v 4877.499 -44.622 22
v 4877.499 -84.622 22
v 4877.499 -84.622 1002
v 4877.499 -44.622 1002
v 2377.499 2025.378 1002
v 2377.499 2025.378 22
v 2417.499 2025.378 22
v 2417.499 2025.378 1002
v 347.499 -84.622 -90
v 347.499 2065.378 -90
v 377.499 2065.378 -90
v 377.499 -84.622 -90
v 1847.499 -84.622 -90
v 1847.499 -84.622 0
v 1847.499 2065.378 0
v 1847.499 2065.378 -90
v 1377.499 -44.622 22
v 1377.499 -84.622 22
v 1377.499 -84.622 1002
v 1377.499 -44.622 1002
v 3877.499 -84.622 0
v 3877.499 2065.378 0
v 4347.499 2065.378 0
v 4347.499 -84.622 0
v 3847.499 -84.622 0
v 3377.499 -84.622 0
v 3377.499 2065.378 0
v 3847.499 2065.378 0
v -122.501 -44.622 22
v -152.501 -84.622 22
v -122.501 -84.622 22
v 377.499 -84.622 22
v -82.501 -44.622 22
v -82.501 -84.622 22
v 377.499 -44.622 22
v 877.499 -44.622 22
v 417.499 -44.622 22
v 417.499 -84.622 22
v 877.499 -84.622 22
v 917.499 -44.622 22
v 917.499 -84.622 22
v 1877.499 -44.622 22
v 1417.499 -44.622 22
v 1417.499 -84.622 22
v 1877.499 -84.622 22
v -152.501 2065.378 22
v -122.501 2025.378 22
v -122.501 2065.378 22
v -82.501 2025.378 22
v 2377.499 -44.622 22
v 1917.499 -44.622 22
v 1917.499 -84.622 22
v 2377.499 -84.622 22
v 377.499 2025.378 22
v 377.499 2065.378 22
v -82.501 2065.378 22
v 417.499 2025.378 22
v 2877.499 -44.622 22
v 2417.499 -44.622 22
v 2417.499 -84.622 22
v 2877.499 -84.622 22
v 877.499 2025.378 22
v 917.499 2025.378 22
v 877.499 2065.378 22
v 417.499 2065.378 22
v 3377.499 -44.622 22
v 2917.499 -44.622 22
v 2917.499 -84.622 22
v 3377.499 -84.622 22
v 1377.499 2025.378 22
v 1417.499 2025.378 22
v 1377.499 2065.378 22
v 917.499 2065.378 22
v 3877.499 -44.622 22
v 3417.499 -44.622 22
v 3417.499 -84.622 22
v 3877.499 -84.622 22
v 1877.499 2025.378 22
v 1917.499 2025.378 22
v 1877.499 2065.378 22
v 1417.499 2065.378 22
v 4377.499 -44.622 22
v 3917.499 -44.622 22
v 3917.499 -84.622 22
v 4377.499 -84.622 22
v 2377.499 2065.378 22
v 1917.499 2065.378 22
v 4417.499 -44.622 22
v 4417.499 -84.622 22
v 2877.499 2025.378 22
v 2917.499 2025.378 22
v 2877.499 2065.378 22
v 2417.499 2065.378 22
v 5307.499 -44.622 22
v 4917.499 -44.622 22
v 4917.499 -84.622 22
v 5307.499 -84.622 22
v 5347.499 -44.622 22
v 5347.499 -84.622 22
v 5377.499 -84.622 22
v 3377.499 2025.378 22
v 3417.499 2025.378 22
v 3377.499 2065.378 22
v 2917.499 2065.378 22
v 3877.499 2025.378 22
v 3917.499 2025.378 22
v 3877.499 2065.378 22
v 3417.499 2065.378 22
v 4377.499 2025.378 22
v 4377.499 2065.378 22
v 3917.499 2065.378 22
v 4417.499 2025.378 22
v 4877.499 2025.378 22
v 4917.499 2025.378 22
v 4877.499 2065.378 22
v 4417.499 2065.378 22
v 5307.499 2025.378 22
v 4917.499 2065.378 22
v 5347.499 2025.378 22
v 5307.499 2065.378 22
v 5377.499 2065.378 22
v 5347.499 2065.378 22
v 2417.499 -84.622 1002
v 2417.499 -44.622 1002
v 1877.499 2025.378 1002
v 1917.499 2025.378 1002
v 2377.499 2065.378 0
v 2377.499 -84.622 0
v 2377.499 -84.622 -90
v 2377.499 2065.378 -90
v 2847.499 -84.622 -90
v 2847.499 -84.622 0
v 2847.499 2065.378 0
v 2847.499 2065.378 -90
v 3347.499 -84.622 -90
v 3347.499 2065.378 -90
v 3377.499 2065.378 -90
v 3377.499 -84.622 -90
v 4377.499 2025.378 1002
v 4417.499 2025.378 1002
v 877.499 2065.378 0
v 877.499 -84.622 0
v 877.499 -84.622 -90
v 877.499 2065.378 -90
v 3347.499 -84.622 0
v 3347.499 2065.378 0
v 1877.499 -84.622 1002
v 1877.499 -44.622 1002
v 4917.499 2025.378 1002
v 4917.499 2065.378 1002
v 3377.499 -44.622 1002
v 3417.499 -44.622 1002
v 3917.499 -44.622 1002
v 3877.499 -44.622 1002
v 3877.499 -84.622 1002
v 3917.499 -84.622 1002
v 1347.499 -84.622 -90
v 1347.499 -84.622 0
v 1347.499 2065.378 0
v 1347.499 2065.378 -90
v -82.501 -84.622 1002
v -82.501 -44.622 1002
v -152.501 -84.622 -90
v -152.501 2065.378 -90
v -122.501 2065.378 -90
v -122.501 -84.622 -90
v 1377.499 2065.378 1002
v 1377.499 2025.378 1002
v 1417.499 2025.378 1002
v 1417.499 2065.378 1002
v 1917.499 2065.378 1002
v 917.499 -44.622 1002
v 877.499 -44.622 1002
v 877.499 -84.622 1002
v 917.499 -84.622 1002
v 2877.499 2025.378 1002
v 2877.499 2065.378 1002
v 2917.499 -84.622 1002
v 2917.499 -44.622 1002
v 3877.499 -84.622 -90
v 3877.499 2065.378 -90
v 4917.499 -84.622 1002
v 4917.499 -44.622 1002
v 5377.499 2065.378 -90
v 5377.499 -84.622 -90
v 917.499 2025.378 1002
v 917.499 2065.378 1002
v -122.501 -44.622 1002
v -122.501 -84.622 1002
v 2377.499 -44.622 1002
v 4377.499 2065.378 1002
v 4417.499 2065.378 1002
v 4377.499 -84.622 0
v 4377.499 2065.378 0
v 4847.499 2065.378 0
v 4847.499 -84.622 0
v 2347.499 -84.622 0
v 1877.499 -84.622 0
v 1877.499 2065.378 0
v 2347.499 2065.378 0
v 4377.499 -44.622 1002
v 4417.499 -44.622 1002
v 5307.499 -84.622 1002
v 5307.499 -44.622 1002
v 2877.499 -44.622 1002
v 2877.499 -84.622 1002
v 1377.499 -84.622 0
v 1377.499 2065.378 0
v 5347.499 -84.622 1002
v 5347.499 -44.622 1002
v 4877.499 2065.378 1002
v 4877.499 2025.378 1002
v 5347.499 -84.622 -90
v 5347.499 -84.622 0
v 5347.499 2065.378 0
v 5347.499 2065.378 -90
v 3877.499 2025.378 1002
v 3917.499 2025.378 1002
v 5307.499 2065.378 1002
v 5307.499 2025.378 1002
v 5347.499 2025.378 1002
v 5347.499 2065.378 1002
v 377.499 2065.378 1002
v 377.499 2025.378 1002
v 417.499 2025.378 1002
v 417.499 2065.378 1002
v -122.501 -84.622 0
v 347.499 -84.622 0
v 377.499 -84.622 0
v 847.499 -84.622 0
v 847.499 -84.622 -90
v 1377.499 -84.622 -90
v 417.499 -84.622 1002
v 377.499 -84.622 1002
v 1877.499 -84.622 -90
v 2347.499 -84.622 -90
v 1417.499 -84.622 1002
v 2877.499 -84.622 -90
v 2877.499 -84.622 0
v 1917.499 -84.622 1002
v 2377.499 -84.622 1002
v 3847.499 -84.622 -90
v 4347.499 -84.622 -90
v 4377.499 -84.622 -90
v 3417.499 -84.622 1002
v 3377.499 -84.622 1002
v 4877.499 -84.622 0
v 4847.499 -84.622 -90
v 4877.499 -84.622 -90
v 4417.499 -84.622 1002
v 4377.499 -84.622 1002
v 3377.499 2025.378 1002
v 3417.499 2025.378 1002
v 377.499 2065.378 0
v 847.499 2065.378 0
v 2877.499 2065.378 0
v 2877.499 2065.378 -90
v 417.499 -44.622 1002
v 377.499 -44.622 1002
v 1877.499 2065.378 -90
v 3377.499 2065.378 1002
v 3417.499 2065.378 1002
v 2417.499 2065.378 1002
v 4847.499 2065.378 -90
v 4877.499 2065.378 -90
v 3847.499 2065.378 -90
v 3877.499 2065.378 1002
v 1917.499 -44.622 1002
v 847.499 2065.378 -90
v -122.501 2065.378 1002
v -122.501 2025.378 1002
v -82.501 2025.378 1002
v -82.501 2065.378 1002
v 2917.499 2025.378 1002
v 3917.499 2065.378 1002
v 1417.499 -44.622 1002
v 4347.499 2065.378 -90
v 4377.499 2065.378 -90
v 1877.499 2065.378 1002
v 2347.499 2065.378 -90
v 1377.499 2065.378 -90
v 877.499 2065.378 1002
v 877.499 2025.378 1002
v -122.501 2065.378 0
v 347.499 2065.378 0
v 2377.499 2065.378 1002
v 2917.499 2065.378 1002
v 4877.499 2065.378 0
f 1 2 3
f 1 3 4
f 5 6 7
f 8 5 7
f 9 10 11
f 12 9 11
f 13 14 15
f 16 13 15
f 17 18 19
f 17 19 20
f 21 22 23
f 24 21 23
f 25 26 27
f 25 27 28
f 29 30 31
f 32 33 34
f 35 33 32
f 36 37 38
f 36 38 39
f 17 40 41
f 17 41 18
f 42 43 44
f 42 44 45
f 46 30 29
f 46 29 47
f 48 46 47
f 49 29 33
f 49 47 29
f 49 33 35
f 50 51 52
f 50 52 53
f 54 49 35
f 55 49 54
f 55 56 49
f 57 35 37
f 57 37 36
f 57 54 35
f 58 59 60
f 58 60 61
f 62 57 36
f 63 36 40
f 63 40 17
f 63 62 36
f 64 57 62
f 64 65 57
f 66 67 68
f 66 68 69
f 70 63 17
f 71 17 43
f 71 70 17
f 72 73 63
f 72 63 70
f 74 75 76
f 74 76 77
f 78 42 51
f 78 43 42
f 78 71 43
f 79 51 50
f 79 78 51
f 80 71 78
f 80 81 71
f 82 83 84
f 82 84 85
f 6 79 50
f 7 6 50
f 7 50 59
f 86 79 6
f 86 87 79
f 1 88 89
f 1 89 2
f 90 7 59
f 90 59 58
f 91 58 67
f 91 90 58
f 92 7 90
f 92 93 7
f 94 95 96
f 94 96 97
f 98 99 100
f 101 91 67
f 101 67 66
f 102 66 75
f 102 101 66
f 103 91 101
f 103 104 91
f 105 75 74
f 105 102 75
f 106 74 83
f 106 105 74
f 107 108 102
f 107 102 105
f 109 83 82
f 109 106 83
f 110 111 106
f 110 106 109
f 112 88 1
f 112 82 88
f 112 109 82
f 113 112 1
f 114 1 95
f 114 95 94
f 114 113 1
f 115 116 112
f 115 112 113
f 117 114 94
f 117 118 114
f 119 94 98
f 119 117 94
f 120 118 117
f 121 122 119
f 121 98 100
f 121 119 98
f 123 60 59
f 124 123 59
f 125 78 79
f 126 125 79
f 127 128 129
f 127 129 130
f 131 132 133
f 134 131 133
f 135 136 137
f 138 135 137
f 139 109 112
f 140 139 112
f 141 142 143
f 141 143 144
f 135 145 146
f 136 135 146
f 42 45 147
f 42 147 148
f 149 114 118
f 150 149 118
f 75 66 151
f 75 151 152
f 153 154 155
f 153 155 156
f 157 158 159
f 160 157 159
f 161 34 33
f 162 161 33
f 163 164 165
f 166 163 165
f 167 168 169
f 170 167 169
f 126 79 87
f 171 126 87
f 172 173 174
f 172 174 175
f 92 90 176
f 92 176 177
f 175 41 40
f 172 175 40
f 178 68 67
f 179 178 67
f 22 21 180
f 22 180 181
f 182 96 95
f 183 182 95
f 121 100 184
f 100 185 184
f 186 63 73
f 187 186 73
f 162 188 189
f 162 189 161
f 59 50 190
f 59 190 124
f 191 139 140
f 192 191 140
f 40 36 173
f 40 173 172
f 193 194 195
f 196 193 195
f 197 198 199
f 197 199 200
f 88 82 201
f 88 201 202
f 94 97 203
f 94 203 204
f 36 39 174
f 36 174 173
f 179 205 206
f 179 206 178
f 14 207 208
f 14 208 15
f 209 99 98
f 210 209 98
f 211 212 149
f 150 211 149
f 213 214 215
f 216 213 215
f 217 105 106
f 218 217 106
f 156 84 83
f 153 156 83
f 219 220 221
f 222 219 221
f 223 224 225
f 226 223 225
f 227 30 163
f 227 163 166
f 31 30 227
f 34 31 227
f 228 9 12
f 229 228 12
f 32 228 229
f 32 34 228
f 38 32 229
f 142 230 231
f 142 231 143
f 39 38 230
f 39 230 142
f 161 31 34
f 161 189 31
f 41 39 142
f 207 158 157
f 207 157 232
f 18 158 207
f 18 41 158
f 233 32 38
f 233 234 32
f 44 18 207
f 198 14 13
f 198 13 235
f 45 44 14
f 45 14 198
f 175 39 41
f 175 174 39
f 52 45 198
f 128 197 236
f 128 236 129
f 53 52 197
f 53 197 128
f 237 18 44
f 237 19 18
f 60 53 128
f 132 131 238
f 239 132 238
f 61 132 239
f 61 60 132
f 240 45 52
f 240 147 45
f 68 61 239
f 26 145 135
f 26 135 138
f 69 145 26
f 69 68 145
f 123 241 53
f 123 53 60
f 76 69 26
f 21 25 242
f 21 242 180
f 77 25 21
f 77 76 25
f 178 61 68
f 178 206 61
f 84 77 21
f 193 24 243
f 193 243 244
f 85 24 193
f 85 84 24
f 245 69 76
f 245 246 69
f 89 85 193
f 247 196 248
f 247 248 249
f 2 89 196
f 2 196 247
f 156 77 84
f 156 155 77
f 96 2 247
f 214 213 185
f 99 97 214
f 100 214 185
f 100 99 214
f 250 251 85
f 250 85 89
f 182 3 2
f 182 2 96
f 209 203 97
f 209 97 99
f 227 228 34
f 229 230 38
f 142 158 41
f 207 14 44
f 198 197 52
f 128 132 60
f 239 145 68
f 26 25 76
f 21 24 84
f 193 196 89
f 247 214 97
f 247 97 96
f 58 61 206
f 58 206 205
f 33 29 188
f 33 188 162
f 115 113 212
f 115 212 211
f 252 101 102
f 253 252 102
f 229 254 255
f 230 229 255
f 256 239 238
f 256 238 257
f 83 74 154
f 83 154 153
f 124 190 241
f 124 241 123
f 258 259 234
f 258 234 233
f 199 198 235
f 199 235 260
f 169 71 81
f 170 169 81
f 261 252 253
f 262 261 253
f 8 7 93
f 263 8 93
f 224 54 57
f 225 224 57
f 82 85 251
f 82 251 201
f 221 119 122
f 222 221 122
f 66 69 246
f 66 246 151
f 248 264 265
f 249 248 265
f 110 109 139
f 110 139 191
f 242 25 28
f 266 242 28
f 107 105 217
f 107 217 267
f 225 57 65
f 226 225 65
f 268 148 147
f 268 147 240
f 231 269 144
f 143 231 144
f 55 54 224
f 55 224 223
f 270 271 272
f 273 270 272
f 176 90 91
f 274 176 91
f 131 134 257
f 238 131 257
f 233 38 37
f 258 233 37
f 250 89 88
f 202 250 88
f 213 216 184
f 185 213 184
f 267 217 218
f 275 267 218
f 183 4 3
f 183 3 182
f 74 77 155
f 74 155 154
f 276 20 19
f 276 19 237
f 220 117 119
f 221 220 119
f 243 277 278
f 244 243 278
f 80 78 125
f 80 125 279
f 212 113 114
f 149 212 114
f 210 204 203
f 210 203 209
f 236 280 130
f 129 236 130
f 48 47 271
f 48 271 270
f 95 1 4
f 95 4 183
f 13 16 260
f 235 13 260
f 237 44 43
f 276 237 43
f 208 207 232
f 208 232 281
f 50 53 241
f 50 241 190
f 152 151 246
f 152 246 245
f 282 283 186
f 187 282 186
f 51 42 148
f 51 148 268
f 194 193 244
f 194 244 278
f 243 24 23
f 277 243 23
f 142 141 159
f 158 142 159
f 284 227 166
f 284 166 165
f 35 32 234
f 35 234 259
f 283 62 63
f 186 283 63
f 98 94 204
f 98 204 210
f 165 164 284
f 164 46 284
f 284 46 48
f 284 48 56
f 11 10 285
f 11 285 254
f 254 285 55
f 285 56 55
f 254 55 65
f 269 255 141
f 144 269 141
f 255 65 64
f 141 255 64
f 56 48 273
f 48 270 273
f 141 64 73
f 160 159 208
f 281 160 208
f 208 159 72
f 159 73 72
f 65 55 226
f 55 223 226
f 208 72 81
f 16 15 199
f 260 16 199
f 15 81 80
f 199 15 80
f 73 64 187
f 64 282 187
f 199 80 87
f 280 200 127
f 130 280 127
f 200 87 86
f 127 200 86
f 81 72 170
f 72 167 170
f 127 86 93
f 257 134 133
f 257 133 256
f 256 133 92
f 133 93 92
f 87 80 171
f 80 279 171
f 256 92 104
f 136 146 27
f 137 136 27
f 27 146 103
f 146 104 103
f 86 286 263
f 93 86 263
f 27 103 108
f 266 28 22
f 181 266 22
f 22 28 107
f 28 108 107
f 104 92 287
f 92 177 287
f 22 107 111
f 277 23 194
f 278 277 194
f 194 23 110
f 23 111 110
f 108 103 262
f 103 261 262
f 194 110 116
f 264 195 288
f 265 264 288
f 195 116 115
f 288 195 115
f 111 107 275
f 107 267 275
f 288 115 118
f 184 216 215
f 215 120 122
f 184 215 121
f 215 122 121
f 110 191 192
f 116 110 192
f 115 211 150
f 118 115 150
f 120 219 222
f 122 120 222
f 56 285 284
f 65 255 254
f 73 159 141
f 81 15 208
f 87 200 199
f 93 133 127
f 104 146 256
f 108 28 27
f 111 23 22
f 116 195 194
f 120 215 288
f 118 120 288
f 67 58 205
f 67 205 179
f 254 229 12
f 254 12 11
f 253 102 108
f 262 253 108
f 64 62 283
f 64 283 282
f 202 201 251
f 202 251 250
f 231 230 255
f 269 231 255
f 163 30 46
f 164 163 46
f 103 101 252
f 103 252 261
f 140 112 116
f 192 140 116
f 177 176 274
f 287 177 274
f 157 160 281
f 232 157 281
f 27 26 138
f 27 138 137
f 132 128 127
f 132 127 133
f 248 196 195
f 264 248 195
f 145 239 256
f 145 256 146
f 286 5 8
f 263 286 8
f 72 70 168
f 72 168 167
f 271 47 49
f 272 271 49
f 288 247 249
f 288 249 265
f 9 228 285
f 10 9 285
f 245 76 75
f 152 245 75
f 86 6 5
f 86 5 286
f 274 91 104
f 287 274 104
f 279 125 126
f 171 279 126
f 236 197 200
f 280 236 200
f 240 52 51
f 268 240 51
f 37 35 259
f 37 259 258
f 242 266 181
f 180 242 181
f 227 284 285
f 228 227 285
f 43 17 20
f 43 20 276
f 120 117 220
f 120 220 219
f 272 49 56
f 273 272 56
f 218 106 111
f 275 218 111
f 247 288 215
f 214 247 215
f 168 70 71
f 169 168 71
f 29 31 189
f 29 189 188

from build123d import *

# Parameters (mm, degrees)
F0_W     = 30.000001
F0_H     = 2150
F0_W_2   = 469.999999
F1_DEPTH = 22
F2_DEPTH = 90
F3_W     = 40
F3_H     = 40
F4_DEPTH = 980


with BuildPart() as f1:
    # F0 (on Top) → F1 (new body)
    with BuildSketch(Plane.XY):
        with Locations((-137.50112, 990.378466)):
            Rectangle(F0_W, F0_H)
        with Locations((112.498879, 990.378466)):
            Rectangle(F0_W_2, F0_H)
        with Locations((362.498879, 990.378466)):
            Rectangle(F0_W, F0_H)
        with Locations((612.498879, 990.378466)):
            Rectangle(F0_W_2, F0_H)
        with Locations((862.498879, 990.378466)):
            Rectangle(F0_W, F0_H)
        with Locations((1112.498879, 990.378466)):
            Rectangle(F0_W_2, F0_H)
        with Locations((1362.498879, 990.378466)):
            Rectangle(F0_W, F0_H)
        with Locations((1612.498879, 990.378466)):
            Rectangle(F0_W_2, F0_H)
        with Locations((1862.498879, 990.378466)):
            Rectangle(F0_W, F0_H)
        with Locations((2112.498879, 990.378466)):
            Rectangle(F0_W_2, F0_H)
        with Locations((2362.498879, 990.378466)):
            Rectangle(F0_W, F0_H)
        with Locations((2612.498879, 990.378466)):
            Rectangle(F0_W_2, F0_H)
        with Locations((2862.498879, 990.378466)):
            Rectangle(F0_W, F0_H)
        with Locations((3112.498879, 990.378466)):
            Rectangle(F0_W_2, F0_H)
        with Locations((3362.498879, 990.378466)):
            Rectangle(F0_W, F0_H)
        with Locations((3612.498879, 990.378466)):
            Rectangle(F0_W_2, F0_H)
        with Locations((3862.498879, 990.378466)):
            Rectangle(F0_W, F0_H)
        with Locations((4112.498879, 990.378466)):
            Rectangle(F0_W_2, F0_H)
        with Locations((4362.498879, 990.378466)):
            Rectangle(F0_W, F0_H)
        with Locations((4612.498879, 990.378466)):
            Rectangle(F0_W_2, F0_H)
        with Locations((4862.498879, 990.378466)):
            Rectangle(F0_W, F0_H)
        with Locations((5112.498879, 990.378466)):
            Rectangle(F0_W_2, F0_H)
        with Locations((5362.498879, 990.378466)):
            Rectangle(F0_W, F0_H)
    extrude(amount=F1_DEPTH)

    # F0 (on Top) → F2 (join)
    with BuildSketch(Plane.XY):
        with Locations((-137.50112, 990.378466)):
            Rectangle(F0_W, F0_H)
        with Locations((362.498879, 990.378466)):
            Rectangle(F0_W, F0_H)
        with Locations((862.498879, 990.378466)):
            Rectangle(F0_W, F0_H)
        with Locations((1362.498879, 990.378466)):
            Rectangle(F0_W, F0_H)
        with Locations((1862.498879, 990.378466)):
            Rectangle(F0_W, F0_H)
        with Locations((2362.498879, 990.378466)):
            Rectangle(F0_W, F0_H)
        with Locations((2862.498879, 990.378466)):
            Rectangle(F0_W, F0_H)
        with Locations((3362.498879, 990.378466)):
            Rectangle(F0_W, F0_H)
        with Locations((3862.498879, 990.378466)):
            Rectangle(F0_W, F0_H)
        with Locations((4362.498879, 990.378466)):
            Rectangle(F0_W, F0_H)
        with Locations((4862.498879, 990.378466)):
            Rectangle(F0_W, F0_H)
        with Locations((5362.498879, 990.378466)):
            Rectangle(F0_W, F0_H)
    extrude(amount=-F2_DEPTH)

    # F3 (on face) → F4 (join)
    with BuildSketch(Plane.XY.offset(22)):
        with Locations((-102.501121, -64.621534)):
            Rectangle(F3_W, F3_H)
        with Locations((397.498879, -64.621534)):
            Rectangle(F3_W, F3_H)
        with Locations((897.498879, -64.621534)):
            Rectangle(F3_W, F3_H)
        with Locations((-102.501121, 2045.378466)):
            Rectangle(F3_W, F3_H)
        with Locations((397.498879, 2045.378466)):
            Rectangle(F3_W, F3_H)
        with Locations((897.498879, 2045.378466)):
            Rectangle(F3_W, F3_H)
        with Locations((1397.498879, 2045.378466)):
            Rectangle(F3_W, F3_H)
        with Locations((1897.498879, 2045.378466)):
            Rectangle(F3_W, F3_H)
        with Locations((2397.498879, 2045.378466)):
            Rectangle(F3_W, F3_H)
        with Locations((2897.498879, 2045.378466)):
            Rectangle(F3_W, F3_H)
        with Locations((3397.498879, 2045.378466)):
            Rectangle(F3_W, F3_H)
        with Locations((3897.498879, 2045.378466)):
            Rectangle(F3_W, F3_H)
        with Locations((4397.498879, 2045.378466)):
            Rectangle(F3_W, F3_H)
        with Locations((4897.498879, 2045.378466)):
            Rectangle(F3_W, F3_H)
        with Locations((5327.49888, 2045.378466)):
            Rectangle(F3_W, F3_H)
        with Locations((1397.498879, -64.621534)):
            Rectangle(F3_W, F3_H)
        with Locations((1897.498879, -64.621534)):
            Rectangle(F3_W, F3_H)
        with Locations((2397.498879, -64.621534)):
            Rectangle(F3_W, F3_H)
        with Locations((2897.498879, -64.621534)):
            Rectangle(F3_W, F3_H)
        with Locations((3397.498879, -64.621534)):
            Rectangle(F3_W, F3_H)
        with Locations((3897.498879, -64.621534)):
            Rectangle(F3_W, F3_H)
        with Locations((4397.498879, -64.621534)):
            Rectangle(F3_W, F3_H)
        with Locations((4897.498879, -64.621534)):
            Rectangle(F3_W, F3_H)
        with Locations((5327.49888, -64.621534)):
            Rectangle(F3_W, F3_H)
    extrude(amount=F4_DEPTH)


solid = f1.part
